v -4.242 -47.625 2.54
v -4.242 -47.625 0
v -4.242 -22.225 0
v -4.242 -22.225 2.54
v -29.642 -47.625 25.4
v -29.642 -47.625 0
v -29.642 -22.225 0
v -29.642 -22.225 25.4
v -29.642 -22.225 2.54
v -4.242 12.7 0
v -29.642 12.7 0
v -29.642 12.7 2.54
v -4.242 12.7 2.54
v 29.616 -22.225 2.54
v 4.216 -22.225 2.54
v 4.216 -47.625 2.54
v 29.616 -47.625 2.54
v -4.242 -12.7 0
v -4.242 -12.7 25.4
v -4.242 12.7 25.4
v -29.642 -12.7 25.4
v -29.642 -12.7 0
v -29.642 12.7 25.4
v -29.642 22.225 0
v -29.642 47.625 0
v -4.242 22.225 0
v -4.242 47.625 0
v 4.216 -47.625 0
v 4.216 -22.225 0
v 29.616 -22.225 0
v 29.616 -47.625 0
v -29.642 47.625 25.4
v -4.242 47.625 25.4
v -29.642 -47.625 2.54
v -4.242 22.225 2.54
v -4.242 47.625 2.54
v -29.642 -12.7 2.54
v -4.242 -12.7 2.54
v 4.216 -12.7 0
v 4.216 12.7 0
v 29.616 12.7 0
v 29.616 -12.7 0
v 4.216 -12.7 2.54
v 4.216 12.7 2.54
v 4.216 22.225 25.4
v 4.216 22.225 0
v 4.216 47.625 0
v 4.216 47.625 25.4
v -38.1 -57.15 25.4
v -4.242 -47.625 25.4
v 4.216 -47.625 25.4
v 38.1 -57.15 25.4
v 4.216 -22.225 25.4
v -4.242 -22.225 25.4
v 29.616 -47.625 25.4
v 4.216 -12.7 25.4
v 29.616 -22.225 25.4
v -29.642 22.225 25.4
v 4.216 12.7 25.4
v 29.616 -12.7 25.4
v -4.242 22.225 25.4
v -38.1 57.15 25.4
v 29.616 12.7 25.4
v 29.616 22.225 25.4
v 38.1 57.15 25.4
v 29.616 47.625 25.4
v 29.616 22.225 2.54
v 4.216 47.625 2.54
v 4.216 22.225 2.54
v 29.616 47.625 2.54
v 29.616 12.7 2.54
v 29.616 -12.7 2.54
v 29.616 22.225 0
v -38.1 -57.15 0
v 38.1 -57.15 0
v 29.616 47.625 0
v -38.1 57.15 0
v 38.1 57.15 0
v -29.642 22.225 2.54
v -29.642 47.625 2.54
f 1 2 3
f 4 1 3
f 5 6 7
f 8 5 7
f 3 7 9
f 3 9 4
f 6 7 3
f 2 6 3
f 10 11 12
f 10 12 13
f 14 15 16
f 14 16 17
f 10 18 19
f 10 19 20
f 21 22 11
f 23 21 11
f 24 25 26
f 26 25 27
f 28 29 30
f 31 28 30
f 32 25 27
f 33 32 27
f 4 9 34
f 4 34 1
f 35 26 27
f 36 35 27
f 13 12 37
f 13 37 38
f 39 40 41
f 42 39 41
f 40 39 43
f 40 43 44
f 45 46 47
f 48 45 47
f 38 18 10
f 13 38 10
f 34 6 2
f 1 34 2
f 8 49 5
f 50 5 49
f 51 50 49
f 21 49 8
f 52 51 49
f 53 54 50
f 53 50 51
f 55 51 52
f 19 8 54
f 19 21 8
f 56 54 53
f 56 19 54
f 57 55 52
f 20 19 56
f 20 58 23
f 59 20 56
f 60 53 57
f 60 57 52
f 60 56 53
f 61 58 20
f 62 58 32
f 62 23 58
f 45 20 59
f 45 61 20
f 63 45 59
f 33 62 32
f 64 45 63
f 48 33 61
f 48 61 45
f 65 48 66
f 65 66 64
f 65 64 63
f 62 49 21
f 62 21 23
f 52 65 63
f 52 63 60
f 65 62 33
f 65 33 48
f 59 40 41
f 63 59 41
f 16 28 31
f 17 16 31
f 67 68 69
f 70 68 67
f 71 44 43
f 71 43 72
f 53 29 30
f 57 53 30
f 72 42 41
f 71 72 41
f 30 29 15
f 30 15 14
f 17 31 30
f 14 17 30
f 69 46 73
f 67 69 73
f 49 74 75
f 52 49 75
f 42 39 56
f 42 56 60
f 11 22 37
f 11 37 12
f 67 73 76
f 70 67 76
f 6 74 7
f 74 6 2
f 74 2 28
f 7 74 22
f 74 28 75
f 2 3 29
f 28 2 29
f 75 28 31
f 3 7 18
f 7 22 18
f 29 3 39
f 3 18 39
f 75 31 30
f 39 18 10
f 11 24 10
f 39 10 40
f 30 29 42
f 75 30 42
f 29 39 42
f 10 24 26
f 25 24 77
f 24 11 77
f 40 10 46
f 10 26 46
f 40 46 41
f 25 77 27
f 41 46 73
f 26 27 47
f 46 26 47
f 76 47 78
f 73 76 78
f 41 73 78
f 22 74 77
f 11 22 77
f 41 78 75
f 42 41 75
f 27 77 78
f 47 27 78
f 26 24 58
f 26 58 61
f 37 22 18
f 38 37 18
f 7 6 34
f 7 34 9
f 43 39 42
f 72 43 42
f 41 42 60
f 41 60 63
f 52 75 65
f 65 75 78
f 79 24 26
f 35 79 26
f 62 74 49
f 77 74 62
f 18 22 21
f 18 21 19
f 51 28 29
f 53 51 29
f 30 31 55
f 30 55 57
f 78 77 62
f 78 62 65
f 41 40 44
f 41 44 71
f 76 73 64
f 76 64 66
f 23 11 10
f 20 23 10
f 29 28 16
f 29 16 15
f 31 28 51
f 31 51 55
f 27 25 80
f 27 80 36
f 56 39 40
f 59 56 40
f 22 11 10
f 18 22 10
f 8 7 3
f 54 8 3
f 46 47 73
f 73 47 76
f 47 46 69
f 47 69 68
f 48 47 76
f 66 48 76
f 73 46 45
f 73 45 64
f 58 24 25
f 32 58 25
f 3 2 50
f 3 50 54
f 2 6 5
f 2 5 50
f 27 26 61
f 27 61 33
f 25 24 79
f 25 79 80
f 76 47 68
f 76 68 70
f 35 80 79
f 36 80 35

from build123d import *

# Parameters (mm, degrees)
F0_W     = 76.2
F0_H     = 114.3
F0_W_2   = 25.4
F0_H_2   = 25.4
F1_DEPTH = 25.4
F2_DEPTH = 2.54


with BuildPart() as f1:
    # F0 (on Top) → F1 (new body)
    with BuildSketch(Plane.XY):
        Rectangle(F0_W, F0_H)
        with Locations((-16.9418, -34.925)):
            Rectangle(F0_W_2, F0_H_2, mode=Mode.SUBTRACT)
        with Locations((16.9164, -34.925)):
            Rectangle(F0_W_2, F0_H_2, mode=Mode.SUBTRACT)
        with Locations((-16.9418, 0)):
            Rectangle(F0_W_2, F0_H_2, mode=Mode.SUBTRACT)
        with Locations((-16.9418, 34.925)):
            Rectangle(F0_W_2, F0_H_2, mode=Mode.SUBTRACT)
        with Locations((16.9164, 0)):
            Rectangle(F0_W_2, F0_H_2, mode=Mode.SUBTRACT)
        with Locations((16.9164, 34.925)):
            Rectangle(F0_W_2, F0_H_2, mode=Mode.SUBTRACT)
    extrude(amount=F1_DEPTH)


with BuildPart() as f2:
    # F0 (on Top) → F2 (new body)
    with BuildSketch(Plane.XY):
        with Locations((-16.9418, 34.925)):
            Rectangle(F0_W_2, F0_H_2)
        with Locations((16.9164, 34.925)):
            Rectangle(F0_W_2, F0_H_2)
        with Locations((-16.9418, 0)):
            Rectangle(F0_W_2, F0_H_2)
        with Locations((16.9164, 0)):
            Rectangle(F0_W_2, F0_H_2)
        with Locations((-16.9418, -34.925)):
            Rectangle(F0_W_2, F0_H_2)
        with Locations((16.9164, -34.925)):
            Rectangle(F0_W_2, F0_H_2)
    extrude(amount=F2_DEPTH)


solid = Compound([f1.part, f2.part])
